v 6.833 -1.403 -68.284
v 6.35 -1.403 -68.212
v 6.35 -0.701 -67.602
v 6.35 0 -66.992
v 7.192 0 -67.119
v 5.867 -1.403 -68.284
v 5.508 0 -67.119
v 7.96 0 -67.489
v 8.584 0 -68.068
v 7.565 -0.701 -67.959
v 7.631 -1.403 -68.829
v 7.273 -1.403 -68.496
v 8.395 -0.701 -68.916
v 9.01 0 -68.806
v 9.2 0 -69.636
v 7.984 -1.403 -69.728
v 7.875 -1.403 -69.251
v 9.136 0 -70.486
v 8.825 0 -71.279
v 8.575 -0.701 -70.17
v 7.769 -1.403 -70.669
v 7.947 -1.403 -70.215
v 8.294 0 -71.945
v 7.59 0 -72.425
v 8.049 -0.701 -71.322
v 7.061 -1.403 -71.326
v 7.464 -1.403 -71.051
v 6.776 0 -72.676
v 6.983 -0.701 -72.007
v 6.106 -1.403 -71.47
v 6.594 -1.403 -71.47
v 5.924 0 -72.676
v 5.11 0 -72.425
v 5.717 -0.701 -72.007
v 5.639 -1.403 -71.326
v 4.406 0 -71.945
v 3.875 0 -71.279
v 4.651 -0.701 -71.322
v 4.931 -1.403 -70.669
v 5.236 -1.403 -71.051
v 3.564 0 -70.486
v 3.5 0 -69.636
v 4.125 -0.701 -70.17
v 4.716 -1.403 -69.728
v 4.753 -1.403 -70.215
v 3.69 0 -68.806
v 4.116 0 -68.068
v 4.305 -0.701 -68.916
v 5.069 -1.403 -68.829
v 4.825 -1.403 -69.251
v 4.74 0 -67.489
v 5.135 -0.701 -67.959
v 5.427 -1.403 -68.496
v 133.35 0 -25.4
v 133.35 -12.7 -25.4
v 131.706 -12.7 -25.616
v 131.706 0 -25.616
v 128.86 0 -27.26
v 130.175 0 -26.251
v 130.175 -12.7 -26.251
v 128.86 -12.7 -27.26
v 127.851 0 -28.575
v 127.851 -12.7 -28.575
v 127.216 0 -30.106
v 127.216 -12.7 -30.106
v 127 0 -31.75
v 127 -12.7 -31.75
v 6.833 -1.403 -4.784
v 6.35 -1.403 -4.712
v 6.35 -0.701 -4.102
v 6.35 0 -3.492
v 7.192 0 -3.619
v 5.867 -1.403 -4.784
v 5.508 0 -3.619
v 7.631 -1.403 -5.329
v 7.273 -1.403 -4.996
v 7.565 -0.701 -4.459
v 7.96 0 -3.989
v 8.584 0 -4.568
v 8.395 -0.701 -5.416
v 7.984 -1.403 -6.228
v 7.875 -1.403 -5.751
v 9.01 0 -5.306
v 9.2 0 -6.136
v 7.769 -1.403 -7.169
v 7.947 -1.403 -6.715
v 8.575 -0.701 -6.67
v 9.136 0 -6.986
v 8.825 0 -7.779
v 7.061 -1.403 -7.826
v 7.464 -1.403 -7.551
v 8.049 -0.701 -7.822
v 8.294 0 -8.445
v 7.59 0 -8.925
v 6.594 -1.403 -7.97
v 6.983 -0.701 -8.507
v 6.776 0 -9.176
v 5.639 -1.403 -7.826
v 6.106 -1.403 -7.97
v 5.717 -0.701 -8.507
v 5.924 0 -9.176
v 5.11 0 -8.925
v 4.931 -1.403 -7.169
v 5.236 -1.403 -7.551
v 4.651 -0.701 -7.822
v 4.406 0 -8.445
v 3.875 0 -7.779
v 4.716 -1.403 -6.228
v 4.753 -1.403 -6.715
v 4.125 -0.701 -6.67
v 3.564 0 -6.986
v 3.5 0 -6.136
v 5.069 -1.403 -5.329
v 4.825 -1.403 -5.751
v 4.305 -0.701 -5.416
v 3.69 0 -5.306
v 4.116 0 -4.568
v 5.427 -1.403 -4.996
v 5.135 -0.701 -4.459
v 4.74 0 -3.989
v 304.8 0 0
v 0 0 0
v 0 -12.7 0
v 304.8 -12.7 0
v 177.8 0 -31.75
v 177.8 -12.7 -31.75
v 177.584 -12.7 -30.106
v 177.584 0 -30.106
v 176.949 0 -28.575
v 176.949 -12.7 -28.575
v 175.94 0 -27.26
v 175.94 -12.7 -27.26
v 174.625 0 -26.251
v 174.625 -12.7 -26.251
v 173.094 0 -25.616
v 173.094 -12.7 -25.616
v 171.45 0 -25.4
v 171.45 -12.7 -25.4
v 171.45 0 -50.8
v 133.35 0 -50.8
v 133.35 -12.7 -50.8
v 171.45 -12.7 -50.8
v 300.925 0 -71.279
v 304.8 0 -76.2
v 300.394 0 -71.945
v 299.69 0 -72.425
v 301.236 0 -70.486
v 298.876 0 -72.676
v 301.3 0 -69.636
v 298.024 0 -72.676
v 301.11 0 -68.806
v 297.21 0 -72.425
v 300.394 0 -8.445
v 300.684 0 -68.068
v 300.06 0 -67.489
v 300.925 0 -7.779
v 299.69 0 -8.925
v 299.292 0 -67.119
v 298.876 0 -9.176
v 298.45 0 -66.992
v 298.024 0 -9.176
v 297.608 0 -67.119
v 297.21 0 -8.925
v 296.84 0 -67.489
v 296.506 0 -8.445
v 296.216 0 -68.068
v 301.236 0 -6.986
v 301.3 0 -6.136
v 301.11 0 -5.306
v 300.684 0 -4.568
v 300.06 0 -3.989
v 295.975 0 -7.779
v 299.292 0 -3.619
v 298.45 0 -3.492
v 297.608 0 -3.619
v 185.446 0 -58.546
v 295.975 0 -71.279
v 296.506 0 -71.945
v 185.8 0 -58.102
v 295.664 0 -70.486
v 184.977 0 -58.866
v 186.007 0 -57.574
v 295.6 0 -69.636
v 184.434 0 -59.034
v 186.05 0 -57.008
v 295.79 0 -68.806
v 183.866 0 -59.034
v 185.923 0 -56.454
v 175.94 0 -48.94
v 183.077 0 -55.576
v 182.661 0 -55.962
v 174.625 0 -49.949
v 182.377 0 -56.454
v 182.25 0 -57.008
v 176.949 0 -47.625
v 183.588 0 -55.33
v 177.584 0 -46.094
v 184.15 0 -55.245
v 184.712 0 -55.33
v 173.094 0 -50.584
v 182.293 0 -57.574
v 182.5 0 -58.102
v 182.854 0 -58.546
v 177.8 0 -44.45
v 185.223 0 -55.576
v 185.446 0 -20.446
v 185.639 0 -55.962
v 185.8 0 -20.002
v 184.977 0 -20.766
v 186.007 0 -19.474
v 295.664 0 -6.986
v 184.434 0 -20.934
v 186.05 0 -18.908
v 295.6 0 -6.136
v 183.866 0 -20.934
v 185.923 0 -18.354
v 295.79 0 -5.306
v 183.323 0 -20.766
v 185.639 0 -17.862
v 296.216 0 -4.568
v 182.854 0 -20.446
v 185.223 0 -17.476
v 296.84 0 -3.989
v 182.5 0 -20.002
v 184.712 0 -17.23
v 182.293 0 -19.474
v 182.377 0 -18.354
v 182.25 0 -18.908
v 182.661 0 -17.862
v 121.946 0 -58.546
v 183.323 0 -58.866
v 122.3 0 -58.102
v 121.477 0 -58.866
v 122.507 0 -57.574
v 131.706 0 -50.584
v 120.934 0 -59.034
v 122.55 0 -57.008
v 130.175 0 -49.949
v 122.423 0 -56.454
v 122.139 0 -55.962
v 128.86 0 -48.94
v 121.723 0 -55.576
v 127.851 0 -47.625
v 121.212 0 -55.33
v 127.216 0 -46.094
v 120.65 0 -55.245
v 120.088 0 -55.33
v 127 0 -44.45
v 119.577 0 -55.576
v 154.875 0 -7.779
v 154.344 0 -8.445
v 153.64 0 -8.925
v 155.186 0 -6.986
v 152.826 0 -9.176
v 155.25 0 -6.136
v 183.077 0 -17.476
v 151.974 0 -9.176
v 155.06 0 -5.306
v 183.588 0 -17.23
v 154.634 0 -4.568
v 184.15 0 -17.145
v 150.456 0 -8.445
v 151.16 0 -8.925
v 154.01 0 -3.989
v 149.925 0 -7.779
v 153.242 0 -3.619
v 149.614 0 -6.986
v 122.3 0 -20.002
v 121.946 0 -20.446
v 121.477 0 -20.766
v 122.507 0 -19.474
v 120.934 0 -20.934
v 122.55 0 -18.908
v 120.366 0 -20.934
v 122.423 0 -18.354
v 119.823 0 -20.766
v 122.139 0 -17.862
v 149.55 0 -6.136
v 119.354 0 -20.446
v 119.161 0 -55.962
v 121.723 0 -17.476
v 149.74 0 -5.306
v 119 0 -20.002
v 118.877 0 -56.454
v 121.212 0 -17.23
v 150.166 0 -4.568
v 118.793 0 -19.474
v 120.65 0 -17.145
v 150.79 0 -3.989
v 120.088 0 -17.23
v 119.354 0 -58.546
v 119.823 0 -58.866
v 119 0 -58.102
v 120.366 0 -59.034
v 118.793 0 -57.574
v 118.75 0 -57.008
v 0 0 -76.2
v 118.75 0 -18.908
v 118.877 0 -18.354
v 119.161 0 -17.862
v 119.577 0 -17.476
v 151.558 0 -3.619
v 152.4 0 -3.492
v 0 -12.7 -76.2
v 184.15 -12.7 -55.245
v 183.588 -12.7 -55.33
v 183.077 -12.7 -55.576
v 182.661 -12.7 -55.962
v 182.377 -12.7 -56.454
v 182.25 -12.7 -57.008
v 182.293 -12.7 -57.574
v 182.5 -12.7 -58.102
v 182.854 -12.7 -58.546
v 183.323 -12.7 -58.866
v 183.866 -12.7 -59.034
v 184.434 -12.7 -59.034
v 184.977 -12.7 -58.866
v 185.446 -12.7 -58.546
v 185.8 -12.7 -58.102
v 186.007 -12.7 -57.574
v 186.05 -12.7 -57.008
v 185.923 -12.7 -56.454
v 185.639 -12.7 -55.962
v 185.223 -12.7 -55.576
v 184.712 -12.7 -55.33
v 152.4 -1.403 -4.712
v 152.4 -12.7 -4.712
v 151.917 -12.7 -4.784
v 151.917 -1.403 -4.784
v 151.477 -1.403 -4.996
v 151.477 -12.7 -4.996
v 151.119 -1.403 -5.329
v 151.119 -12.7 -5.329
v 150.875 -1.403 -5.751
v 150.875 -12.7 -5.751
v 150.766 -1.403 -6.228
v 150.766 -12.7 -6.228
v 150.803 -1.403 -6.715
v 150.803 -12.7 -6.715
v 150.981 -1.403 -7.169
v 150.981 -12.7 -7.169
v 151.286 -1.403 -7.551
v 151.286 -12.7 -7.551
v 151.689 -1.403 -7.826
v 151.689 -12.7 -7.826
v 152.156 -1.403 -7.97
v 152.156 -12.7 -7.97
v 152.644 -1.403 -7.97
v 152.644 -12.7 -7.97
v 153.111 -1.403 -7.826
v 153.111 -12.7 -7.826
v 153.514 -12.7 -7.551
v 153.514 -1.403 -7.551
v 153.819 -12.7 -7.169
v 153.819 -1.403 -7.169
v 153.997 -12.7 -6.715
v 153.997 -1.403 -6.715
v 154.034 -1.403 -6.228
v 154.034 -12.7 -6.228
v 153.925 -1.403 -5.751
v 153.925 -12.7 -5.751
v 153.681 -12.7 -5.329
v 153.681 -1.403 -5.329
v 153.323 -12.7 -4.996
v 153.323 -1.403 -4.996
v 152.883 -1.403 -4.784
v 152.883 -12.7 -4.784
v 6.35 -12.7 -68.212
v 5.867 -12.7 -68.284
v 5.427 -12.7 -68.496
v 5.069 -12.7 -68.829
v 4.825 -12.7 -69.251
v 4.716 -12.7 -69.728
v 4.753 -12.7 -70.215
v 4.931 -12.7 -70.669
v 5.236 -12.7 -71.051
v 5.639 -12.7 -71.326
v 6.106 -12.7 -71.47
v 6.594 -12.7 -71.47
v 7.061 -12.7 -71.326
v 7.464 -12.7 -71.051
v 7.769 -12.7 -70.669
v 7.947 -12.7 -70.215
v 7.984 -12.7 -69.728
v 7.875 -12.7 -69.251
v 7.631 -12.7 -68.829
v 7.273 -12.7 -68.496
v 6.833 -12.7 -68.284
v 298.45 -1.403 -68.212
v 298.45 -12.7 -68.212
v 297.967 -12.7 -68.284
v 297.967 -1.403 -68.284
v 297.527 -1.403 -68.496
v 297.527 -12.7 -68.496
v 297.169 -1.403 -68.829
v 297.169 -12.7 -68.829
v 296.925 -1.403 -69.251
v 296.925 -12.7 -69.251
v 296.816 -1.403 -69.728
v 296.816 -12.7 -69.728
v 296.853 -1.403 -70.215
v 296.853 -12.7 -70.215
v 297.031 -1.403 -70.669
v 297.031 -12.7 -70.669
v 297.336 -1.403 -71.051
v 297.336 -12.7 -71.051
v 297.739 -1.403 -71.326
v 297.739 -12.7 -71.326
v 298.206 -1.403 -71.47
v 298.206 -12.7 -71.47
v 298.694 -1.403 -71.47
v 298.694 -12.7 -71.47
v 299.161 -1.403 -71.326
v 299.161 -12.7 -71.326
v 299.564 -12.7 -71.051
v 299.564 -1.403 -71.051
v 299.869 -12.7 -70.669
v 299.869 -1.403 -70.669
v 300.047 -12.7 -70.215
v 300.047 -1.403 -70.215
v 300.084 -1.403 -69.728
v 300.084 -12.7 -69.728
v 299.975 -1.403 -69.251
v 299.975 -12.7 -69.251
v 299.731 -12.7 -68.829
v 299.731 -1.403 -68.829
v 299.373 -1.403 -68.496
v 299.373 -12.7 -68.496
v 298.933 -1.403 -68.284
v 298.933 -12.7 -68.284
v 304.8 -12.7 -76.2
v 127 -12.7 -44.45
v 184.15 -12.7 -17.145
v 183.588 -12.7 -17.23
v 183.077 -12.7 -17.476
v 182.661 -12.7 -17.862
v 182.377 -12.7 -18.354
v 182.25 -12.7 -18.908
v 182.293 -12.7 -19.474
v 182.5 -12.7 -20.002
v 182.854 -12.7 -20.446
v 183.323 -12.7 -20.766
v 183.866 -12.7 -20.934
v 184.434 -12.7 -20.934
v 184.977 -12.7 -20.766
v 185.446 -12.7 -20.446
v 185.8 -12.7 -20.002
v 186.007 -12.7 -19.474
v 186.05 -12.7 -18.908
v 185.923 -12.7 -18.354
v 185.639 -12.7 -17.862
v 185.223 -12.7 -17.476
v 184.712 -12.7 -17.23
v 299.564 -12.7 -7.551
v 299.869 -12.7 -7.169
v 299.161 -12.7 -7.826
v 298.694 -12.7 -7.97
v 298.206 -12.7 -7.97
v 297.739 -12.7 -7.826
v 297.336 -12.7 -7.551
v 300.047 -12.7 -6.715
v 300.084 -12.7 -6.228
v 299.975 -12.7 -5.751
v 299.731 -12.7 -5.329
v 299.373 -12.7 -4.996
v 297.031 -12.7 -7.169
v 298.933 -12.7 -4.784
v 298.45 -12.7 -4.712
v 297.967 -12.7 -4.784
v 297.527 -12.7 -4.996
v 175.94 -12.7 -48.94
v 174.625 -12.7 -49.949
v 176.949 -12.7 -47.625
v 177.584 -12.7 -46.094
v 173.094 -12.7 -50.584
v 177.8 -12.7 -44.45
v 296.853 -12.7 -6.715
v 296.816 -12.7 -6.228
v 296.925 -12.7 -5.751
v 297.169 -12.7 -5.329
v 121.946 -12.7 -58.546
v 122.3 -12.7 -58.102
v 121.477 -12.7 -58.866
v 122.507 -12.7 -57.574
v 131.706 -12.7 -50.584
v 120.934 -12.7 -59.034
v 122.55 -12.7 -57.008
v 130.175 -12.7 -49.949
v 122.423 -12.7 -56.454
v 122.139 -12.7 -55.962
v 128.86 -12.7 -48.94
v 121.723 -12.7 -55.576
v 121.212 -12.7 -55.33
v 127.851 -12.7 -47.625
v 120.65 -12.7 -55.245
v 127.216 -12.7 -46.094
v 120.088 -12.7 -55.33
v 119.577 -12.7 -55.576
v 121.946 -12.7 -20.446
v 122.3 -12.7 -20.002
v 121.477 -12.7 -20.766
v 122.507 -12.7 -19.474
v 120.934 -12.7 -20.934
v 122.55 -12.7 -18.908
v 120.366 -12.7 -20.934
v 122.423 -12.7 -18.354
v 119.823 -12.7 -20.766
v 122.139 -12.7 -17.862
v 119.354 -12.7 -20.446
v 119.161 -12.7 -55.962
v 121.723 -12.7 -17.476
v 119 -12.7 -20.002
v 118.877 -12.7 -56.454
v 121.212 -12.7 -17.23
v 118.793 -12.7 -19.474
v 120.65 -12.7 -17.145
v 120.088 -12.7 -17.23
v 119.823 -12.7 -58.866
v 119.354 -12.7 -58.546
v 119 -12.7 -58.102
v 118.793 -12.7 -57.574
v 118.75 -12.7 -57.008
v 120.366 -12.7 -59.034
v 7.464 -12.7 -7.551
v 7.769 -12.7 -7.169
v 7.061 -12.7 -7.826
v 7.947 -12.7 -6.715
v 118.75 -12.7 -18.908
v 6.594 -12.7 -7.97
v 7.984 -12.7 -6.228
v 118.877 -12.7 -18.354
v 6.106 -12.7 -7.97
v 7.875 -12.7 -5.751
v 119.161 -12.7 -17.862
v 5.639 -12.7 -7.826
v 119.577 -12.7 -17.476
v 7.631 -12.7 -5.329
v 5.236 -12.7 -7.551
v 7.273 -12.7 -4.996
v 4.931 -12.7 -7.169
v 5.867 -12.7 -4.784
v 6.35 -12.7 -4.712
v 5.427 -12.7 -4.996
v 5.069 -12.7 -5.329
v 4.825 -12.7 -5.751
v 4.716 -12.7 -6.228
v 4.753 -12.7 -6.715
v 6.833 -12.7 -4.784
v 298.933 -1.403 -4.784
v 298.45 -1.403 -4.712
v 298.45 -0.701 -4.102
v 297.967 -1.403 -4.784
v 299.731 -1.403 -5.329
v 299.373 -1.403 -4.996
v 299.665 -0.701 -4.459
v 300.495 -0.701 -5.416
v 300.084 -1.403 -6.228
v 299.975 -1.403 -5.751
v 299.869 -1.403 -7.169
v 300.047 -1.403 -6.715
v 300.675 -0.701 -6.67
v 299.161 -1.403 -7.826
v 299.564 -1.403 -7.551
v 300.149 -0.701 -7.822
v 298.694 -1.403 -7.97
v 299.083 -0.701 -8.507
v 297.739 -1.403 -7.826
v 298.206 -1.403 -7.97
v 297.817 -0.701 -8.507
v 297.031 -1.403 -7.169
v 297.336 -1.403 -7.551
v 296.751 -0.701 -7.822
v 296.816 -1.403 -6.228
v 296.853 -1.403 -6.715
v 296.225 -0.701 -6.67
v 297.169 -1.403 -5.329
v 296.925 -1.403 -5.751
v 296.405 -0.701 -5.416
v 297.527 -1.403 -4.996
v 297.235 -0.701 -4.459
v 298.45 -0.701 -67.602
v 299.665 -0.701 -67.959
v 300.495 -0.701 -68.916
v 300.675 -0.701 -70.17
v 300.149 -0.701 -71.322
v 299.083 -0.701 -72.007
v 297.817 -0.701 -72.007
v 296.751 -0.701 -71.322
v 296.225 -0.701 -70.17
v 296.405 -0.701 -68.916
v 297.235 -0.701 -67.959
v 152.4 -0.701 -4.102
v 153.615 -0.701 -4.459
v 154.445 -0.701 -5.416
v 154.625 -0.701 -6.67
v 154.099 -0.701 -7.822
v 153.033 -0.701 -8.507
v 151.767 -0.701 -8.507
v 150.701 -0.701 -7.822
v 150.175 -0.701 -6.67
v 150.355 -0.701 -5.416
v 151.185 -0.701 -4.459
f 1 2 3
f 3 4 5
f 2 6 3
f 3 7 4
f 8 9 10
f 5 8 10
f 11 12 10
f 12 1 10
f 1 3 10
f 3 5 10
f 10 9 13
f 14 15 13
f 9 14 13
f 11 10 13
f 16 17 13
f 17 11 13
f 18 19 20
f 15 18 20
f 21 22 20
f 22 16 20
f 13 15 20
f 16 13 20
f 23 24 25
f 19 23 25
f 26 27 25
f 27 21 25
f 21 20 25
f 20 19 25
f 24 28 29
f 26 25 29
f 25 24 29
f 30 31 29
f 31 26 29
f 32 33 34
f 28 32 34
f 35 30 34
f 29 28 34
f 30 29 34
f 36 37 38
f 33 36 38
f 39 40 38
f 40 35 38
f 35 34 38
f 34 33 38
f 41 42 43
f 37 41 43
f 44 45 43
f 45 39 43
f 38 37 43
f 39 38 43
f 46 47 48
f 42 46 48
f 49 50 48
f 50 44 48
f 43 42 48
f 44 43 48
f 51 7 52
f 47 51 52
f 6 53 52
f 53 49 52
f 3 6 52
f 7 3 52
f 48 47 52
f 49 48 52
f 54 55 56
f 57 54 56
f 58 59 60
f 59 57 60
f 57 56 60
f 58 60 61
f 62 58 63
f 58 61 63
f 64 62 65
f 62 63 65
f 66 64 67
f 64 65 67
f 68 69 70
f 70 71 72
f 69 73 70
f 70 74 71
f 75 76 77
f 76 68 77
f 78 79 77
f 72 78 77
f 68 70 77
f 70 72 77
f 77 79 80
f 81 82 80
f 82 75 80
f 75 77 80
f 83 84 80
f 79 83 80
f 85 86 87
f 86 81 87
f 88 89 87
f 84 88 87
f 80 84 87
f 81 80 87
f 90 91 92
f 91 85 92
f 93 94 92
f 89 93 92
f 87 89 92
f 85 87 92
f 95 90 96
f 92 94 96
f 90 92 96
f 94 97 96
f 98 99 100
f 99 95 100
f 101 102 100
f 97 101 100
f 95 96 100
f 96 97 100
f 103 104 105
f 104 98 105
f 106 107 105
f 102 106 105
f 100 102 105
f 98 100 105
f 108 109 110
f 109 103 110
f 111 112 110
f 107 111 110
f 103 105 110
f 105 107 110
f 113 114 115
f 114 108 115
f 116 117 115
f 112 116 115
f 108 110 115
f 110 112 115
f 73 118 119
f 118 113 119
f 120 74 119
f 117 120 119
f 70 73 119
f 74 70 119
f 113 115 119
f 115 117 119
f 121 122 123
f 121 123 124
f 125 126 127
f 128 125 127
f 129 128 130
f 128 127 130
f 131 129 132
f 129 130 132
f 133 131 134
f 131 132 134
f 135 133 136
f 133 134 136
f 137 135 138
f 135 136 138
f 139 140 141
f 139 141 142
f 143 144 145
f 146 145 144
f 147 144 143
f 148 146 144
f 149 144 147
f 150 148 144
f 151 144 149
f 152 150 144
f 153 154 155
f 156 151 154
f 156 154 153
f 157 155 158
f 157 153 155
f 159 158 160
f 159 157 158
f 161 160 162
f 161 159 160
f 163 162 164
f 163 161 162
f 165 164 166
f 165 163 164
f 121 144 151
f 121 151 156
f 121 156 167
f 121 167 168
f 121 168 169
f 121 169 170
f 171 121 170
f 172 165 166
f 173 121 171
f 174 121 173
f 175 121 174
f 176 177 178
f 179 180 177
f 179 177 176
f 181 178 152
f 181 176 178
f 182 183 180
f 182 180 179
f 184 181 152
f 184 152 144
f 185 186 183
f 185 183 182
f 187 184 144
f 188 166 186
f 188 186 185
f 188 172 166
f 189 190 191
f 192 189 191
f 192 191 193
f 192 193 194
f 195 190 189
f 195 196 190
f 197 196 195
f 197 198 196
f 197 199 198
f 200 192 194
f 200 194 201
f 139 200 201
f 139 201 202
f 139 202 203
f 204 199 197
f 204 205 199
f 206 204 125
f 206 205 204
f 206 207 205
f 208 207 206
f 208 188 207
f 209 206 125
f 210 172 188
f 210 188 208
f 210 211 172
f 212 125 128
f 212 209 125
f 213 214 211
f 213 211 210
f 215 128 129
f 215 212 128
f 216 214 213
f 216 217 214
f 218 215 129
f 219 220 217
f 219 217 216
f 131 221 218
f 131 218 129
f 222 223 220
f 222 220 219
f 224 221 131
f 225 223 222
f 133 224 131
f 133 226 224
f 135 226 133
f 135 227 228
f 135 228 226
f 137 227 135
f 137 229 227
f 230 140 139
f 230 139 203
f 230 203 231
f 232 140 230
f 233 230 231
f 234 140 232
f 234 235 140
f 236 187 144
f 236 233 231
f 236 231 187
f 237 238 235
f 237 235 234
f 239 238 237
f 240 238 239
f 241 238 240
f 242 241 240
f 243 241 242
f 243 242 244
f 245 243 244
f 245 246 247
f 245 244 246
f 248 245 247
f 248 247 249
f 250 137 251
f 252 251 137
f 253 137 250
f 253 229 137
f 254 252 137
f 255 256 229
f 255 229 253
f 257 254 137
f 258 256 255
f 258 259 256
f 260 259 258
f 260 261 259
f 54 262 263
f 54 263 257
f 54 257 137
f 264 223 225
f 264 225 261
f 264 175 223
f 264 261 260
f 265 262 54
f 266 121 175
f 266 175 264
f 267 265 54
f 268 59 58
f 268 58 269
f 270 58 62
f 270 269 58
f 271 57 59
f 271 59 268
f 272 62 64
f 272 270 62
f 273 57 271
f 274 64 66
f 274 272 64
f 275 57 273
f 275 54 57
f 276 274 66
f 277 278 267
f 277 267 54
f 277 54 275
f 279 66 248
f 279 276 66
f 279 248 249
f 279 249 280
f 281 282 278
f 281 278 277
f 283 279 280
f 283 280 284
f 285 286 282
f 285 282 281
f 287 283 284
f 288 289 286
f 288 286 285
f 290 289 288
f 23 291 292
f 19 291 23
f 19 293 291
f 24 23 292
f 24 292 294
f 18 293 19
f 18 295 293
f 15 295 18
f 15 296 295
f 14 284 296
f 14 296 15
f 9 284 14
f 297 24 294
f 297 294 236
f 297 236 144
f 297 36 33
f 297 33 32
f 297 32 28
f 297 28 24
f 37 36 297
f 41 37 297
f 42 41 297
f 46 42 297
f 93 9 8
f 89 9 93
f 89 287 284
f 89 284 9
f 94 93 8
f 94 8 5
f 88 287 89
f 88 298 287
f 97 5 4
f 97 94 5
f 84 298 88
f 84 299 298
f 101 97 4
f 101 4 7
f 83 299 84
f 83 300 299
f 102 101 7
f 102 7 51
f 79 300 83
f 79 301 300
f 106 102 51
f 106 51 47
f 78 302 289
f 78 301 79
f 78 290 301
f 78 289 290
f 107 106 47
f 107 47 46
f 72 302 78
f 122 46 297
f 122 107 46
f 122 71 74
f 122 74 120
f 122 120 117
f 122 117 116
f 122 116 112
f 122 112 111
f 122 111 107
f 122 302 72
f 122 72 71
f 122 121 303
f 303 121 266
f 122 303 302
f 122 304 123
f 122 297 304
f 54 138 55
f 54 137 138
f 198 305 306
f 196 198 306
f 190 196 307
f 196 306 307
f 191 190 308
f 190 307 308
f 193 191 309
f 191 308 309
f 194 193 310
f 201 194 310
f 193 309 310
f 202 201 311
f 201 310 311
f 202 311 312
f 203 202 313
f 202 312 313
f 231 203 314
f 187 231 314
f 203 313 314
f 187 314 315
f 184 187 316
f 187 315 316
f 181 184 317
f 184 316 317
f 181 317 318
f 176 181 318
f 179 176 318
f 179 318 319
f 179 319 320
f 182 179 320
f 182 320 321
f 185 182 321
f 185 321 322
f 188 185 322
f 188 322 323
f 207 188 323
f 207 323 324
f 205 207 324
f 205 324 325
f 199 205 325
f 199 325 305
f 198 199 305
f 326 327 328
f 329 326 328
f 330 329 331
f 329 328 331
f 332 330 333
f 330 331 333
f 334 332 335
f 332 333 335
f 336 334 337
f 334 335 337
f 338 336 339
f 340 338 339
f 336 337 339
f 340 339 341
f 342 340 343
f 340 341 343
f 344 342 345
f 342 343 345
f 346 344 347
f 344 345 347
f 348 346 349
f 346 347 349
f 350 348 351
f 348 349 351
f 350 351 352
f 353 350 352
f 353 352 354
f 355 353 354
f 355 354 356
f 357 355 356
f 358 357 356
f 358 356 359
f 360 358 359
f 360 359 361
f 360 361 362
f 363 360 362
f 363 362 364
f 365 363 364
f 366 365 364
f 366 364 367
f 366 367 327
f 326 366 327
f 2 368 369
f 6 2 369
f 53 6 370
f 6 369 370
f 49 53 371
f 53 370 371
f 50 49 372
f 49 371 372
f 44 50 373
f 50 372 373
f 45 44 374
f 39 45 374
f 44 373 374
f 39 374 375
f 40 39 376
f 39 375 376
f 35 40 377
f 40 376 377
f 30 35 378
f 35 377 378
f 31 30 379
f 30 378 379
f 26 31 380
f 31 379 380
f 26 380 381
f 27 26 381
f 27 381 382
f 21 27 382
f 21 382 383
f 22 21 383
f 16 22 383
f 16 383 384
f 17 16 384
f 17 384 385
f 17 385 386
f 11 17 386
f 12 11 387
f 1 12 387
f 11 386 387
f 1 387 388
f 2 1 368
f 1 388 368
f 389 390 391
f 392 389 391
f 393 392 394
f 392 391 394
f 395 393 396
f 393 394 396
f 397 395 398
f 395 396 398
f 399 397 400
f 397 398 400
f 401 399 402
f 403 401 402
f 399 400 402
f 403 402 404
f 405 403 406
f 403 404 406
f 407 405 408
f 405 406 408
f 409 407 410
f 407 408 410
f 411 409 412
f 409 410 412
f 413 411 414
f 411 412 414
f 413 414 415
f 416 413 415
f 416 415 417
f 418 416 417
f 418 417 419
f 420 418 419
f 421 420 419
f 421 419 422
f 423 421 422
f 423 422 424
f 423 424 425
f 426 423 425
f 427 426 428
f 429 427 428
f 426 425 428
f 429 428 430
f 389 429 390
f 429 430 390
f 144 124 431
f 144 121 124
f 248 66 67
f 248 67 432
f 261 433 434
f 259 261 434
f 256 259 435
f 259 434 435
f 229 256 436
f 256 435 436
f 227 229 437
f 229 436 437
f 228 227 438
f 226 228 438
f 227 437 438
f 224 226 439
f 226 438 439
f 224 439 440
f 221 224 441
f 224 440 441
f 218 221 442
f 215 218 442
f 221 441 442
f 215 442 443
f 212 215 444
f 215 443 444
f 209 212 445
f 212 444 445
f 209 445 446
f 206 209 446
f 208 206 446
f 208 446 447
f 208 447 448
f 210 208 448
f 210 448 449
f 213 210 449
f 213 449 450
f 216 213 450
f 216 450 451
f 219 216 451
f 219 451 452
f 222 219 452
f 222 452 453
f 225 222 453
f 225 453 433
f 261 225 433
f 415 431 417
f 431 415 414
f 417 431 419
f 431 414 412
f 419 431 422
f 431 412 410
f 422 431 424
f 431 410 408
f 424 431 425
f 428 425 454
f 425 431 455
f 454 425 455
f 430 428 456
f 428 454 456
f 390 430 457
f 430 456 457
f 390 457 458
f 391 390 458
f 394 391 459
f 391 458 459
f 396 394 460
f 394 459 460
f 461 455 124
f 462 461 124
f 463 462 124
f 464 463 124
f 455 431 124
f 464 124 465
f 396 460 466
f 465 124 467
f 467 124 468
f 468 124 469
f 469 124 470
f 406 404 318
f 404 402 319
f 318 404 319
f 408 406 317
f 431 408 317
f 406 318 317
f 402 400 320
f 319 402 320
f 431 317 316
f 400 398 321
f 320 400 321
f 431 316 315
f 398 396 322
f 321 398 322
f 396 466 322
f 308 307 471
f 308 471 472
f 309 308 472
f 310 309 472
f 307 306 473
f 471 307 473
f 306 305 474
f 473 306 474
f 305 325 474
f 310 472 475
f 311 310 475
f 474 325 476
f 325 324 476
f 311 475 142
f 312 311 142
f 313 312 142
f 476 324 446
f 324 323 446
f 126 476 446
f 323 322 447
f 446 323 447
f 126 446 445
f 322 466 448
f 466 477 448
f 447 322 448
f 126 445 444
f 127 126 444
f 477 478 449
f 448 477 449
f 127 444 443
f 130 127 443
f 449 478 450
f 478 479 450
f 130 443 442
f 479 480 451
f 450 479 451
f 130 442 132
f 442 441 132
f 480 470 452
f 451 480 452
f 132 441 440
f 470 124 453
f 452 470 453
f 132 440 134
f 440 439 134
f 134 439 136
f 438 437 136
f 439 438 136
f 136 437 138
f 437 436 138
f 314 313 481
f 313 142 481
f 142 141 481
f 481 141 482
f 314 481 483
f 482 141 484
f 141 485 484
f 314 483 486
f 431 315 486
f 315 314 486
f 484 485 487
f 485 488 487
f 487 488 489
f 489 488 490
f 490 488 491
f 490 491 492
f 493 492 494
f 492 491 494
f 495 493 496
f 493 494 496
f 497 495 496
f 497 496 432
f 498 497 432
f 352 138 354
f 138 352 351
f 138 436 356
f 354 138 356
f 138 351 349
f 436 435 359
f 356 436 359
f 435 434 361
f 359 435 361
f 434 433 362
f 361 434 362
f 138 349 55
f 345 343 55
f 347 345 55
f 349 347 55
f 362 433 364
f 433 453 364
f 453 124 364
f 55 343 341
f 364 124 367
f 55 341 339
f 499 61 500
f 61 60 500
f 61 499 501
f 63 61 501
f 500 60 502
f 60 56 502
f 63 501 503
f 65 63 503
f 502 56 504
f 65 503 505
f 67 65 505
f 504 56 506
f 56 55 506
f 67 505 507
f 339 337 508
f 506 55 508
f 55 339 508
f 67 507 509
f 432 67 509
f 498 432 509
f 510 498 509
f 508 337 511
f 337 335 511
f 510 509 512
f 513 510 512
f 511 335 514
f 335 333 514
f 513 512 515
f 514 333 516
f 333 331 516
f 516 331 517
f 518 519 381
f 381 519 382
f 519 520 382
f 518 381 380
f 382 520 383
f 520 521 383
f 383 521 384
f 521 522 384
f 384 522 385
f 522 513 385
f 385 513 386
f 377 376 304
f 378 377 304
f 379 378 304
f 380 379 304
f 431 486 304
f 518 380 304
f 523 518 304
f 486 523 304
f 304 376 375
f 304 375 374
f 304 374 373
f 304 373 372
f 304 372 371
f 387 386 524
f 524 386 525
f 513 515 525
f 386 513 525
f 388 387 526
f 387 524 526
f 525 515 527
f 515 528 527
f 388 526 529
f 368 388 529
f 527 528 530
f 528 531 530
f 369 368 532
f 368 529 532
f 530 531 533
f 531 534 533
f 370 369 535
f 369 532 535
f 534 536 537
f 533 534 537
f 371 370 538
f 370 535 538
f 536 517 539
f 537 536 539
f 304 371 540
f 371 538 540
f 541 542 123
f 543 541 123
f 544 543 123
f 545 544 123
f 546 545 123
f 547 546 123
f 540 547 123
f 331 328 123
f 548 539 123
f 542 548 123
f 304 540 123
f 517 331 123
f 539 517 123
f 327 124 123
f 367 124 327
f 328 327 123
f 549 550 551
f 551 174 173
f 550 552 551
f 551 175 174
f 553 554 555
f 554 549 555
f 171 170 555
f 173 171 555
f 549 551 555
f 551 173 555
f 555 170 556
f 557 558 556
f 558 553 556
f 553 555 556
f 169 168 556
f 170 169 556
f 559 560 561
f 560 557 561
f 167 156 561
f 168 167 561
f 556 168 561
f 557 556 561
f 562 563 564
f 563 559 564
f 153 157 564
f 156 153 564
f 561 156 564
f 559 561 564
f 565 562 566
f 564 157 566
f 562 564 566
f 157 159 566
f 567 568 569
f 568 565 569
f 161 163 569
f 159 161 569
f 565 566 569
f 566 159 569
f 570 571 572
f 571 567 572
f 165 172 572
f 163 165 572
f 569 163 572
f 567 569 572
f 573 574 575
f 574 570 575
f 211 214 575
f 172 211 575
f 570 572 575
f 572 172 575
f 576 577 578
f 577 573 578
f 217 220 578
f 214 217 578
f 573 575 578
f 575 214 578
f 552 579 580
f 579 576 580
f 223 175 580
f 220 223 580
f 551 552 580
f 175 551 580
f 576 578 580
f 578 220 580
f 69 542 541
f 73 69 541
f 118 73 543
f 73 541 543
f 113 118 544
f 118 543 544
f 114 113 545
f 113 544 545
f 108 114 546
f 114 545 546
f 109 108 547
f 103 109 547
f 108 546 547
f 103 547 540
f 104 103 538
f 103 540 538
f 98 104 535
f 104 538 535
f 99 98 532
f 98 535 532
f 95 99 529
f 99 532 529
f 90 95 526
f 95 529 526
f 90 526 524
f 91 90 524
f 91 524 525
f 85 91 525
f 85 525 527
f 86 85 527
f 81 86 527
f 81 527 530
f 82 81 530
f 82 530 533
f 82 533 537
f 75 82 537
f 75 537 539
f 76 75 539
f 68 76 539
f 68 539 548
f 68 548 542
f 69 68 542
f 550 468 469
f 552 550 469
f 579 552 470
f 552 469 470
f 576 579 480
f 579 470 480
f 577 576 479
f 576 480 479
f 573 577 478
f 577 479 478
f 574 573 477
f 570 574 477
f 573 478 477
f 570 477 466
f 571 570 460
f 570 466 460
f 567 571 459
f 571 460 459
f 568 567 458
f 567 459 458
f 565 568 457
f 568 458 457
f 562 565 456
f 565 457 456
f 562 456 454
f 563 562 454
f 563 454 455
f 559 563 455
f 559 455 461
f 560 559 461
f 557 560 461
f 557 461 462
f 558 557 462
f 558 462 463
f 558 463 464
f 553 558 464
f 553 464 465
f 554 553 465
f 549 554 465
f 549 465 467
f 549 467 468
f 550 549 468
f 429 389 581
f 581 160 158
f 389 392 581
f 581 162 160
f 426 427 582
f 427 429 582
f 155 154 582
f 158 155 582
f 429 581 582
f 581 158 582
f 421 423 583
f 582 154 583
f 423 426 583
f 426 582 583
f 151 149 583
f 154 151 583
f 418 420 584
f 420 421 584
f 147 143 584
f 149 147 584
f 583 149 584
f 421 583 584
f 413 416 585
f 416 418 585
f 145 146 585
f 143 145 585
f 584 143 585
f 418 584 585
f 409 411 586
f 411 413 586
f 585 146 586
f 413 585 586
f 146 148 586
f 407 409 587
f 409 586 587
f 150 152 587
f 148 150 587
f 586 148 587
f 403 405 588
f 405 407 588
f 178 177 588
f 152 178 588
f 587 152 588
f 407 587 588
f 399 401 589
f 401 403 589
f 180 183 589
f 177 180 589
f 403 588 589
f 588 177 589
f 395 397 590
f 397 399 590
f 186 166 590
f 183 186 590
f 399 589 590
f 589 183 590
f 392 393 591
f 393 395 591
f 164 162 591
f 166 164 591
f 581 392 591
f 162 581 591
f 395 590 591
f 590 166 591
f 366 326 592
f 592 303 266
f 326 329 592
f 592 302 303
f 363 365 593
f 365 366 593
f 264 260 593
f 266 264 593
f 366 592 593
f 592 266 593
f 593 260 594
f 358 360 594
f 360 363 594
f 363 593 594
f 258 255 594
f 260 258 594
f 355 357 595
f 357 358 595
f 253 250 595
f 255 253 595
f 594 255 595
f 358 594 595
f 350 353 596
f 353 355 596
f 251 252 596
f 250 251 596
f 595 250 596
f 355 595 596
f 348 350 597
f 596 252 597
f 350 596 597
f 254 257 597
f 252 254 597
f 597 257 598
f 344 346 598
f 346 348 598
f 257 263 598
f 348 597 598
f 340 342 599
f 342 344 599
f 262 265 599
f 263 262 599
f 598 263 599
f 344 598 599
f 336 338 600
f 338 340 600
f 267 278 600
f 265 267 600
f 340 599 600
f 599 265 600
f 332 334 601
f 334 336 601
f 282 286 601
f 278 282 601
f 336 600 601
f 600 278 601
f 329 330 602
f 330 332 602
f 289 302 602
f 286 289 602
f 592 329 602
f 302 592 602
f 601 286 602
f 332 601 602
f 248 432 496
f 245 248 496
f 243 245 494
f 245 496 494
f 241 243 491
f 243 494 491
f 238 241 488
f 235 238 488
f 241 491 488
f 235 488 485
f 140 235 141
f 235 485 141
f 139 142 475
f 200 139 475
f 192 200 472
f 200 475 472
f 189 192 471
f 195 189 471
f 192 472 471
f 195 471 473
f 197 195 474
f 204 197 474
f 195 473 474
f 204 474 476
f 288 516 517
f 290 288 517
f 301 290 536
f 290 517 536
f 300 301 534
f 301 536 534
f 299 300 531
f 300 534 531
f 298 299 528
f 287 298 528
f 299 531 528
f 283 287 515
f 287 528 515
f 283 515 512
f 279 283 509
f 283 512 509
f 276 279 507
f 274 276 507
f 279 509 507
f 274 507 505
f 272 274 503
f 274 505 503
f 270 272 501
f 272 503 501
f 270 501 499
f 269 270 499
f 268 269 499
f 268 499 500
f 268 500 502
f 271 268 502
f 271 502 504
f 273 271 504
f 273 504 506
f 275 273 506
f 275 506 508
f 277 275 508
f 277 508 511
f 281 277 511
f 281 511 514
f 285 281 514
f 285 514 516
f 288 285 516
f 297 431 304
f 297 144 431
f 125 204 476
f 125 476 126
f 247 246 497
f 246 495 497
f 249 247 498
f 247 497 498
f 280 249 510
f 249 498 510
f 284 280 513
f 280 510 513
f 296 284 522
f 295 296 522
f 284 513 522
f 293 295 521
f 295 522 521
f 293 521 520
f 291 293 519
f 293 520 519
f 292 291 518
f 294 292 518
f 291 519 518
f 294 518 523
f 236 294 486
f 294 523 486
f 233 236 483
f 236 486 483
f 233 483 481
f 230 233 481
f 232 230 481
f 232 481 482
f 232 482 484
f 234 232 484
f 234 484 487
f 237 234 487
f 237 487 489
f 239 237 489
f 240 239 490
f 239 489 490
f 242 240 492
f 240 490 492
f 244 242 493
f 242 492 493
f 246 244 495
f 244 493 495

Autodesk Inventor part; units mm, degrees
ref_plane "YZ Plane" through (0, 0, 0) normal (1, 0, 0) x (0, 1, 0)
ref_plane "XZ Plane" through (0, 0, 0) normal (0, 1, 0) x (-1, 0, 0)
ref_plane "XY Plane" through (0, 0, 0) normal (0, 0, 1) x (1, 0, 0)
sketch "Sketch1" plane through (0, 0, 0) normal (0, 1, 0) x (-1, 0, 0)
  line L0 (0, 0) -> (-304.8, 0)
  line L1 (-304.8, 0) -> (-304.8, -76.2)
  line L2 (-304.8, -76.2) -> (0, -76.2)
  line L3 (0, -76.2) -> (0, 0)
  line L4 (-152.4, -76.2) -> (-152.4, 0)
  line L5 (-304.8, -38.1) -> (0, -38.1)
  line L6 (-127, -50.8) -> (-177.8, -50.8)
  line L7 (-177.8, -50.8) -> (-177.8, -25.4)
  line L8 (-177.8, -25.4) -> (-127, -25.4)
  line L9 (-127, -25.4) -> (-127, -50.8)
  line L10 (-127, -50.8) -> (-177.8, -25.4) construction
  line L11 (-177.8, -50.8) -> (-127, -25.4) construction
  line L12 (-120.65, -57.15) -> (-184.15, -57.15) construction
  line L13 (-184.15, -57.15) -> (-184.15, -19.05) construction
  line L14 (-184.15, -19.05) -> (-120.65, -19.05) construction
  line L15 (-120.65, -19.05) -> (-120.65, -57.15) construction
  circle A0 centre (-120.65, -57.15) radius 1.5875
  circle A1 centre (-184.15, -57.15) radius 1.5875
  circle A2 centre (-120.65, -19.05) radius 1.5875
  circle A3 centre (-184.15, -19.05) radius 1.5875
  point P0 (-6.35, -69.85)
  point P1 (-152.4, -38.1)
  point P2 (-6.35, -69.85)
  point P3 (-298.45, -69.85)
  point P4 (-6.35, -6.35)
  point P5 (-298.45, -6.35)
  point P6 (-152.4, -6.35)
  dimension "d0" = 76.2
  dimension "d1" = 304.8
  dimension "d5" = 6.35
  dimension "d6" = 6.35
  dimension "d16" = 50.8
  dimension "d17" = 25.4
  dimension "d19" = 6.35
  dimension "d20" = 3.175
extrude "Extrusion1" add sketch "Sketch1" against normal blind 12.7 contours L3 L5 L9 L8 L4 L0 | L4 L8 L7 L5 L1 L0 | L3 L2 L4 L6 L9 L5 | L5 L7 L6 L4 L2 L1 | A0 | A1 | A2 | A3
hole "Mounting Hole" at (6.35, 0, -69.85) direction (0, -1, 0) diameter 3.2766 end through all countersink diameter 5.715 countersink angle 82 clearance for "Flat Head Machine Screw (82)" size "#4" standard "Ansi Unified Screw Threads"
pattern_sketch "Mounting Holes" of "Mounting Hole" from (6.35, 0, -69.85) copies at (298.45, 0, -69.85) at (298.45, 0, -6.35) at (6.35, 0, -6.35) at (152.4, 0, -6.35)
sketch "Sketch2" plane through (0, 0, 0) normal (0, 1, 0) x (1, 0, 0)
  point P0 (120.65, 57.15)
  point P1 (120.65, 19.05)
  point P2 (184.15, 19.05)
  point P3 (184.15, 57.15)
hole "Jack Plate Mounting" at (120.65, 0, -57.15) direction (0, -1, 0) diameter 3.81 end through all clearance for "Flat Head Machine Screw (82)" size "#6" standard "Ansi Unified Screw Threads"
pattern_sketch "Jack Plate Mounting Holes" of "Jack Plate Mounting" from (120.65, 0, -57.15) copies at (120.65, 0, -19.05) at (184.15, 0, -19.05) at (184.15, 0, -57.15)
fillet "Fillet1" radius 6.35 4 edges at (127, -6.35, -50.8) (127, -6.35, -25.4) (177.8, -6.35, -25.4) (177.8, -6.35, -50.8)
properties material "MDF Medium Density Fiberboard"
